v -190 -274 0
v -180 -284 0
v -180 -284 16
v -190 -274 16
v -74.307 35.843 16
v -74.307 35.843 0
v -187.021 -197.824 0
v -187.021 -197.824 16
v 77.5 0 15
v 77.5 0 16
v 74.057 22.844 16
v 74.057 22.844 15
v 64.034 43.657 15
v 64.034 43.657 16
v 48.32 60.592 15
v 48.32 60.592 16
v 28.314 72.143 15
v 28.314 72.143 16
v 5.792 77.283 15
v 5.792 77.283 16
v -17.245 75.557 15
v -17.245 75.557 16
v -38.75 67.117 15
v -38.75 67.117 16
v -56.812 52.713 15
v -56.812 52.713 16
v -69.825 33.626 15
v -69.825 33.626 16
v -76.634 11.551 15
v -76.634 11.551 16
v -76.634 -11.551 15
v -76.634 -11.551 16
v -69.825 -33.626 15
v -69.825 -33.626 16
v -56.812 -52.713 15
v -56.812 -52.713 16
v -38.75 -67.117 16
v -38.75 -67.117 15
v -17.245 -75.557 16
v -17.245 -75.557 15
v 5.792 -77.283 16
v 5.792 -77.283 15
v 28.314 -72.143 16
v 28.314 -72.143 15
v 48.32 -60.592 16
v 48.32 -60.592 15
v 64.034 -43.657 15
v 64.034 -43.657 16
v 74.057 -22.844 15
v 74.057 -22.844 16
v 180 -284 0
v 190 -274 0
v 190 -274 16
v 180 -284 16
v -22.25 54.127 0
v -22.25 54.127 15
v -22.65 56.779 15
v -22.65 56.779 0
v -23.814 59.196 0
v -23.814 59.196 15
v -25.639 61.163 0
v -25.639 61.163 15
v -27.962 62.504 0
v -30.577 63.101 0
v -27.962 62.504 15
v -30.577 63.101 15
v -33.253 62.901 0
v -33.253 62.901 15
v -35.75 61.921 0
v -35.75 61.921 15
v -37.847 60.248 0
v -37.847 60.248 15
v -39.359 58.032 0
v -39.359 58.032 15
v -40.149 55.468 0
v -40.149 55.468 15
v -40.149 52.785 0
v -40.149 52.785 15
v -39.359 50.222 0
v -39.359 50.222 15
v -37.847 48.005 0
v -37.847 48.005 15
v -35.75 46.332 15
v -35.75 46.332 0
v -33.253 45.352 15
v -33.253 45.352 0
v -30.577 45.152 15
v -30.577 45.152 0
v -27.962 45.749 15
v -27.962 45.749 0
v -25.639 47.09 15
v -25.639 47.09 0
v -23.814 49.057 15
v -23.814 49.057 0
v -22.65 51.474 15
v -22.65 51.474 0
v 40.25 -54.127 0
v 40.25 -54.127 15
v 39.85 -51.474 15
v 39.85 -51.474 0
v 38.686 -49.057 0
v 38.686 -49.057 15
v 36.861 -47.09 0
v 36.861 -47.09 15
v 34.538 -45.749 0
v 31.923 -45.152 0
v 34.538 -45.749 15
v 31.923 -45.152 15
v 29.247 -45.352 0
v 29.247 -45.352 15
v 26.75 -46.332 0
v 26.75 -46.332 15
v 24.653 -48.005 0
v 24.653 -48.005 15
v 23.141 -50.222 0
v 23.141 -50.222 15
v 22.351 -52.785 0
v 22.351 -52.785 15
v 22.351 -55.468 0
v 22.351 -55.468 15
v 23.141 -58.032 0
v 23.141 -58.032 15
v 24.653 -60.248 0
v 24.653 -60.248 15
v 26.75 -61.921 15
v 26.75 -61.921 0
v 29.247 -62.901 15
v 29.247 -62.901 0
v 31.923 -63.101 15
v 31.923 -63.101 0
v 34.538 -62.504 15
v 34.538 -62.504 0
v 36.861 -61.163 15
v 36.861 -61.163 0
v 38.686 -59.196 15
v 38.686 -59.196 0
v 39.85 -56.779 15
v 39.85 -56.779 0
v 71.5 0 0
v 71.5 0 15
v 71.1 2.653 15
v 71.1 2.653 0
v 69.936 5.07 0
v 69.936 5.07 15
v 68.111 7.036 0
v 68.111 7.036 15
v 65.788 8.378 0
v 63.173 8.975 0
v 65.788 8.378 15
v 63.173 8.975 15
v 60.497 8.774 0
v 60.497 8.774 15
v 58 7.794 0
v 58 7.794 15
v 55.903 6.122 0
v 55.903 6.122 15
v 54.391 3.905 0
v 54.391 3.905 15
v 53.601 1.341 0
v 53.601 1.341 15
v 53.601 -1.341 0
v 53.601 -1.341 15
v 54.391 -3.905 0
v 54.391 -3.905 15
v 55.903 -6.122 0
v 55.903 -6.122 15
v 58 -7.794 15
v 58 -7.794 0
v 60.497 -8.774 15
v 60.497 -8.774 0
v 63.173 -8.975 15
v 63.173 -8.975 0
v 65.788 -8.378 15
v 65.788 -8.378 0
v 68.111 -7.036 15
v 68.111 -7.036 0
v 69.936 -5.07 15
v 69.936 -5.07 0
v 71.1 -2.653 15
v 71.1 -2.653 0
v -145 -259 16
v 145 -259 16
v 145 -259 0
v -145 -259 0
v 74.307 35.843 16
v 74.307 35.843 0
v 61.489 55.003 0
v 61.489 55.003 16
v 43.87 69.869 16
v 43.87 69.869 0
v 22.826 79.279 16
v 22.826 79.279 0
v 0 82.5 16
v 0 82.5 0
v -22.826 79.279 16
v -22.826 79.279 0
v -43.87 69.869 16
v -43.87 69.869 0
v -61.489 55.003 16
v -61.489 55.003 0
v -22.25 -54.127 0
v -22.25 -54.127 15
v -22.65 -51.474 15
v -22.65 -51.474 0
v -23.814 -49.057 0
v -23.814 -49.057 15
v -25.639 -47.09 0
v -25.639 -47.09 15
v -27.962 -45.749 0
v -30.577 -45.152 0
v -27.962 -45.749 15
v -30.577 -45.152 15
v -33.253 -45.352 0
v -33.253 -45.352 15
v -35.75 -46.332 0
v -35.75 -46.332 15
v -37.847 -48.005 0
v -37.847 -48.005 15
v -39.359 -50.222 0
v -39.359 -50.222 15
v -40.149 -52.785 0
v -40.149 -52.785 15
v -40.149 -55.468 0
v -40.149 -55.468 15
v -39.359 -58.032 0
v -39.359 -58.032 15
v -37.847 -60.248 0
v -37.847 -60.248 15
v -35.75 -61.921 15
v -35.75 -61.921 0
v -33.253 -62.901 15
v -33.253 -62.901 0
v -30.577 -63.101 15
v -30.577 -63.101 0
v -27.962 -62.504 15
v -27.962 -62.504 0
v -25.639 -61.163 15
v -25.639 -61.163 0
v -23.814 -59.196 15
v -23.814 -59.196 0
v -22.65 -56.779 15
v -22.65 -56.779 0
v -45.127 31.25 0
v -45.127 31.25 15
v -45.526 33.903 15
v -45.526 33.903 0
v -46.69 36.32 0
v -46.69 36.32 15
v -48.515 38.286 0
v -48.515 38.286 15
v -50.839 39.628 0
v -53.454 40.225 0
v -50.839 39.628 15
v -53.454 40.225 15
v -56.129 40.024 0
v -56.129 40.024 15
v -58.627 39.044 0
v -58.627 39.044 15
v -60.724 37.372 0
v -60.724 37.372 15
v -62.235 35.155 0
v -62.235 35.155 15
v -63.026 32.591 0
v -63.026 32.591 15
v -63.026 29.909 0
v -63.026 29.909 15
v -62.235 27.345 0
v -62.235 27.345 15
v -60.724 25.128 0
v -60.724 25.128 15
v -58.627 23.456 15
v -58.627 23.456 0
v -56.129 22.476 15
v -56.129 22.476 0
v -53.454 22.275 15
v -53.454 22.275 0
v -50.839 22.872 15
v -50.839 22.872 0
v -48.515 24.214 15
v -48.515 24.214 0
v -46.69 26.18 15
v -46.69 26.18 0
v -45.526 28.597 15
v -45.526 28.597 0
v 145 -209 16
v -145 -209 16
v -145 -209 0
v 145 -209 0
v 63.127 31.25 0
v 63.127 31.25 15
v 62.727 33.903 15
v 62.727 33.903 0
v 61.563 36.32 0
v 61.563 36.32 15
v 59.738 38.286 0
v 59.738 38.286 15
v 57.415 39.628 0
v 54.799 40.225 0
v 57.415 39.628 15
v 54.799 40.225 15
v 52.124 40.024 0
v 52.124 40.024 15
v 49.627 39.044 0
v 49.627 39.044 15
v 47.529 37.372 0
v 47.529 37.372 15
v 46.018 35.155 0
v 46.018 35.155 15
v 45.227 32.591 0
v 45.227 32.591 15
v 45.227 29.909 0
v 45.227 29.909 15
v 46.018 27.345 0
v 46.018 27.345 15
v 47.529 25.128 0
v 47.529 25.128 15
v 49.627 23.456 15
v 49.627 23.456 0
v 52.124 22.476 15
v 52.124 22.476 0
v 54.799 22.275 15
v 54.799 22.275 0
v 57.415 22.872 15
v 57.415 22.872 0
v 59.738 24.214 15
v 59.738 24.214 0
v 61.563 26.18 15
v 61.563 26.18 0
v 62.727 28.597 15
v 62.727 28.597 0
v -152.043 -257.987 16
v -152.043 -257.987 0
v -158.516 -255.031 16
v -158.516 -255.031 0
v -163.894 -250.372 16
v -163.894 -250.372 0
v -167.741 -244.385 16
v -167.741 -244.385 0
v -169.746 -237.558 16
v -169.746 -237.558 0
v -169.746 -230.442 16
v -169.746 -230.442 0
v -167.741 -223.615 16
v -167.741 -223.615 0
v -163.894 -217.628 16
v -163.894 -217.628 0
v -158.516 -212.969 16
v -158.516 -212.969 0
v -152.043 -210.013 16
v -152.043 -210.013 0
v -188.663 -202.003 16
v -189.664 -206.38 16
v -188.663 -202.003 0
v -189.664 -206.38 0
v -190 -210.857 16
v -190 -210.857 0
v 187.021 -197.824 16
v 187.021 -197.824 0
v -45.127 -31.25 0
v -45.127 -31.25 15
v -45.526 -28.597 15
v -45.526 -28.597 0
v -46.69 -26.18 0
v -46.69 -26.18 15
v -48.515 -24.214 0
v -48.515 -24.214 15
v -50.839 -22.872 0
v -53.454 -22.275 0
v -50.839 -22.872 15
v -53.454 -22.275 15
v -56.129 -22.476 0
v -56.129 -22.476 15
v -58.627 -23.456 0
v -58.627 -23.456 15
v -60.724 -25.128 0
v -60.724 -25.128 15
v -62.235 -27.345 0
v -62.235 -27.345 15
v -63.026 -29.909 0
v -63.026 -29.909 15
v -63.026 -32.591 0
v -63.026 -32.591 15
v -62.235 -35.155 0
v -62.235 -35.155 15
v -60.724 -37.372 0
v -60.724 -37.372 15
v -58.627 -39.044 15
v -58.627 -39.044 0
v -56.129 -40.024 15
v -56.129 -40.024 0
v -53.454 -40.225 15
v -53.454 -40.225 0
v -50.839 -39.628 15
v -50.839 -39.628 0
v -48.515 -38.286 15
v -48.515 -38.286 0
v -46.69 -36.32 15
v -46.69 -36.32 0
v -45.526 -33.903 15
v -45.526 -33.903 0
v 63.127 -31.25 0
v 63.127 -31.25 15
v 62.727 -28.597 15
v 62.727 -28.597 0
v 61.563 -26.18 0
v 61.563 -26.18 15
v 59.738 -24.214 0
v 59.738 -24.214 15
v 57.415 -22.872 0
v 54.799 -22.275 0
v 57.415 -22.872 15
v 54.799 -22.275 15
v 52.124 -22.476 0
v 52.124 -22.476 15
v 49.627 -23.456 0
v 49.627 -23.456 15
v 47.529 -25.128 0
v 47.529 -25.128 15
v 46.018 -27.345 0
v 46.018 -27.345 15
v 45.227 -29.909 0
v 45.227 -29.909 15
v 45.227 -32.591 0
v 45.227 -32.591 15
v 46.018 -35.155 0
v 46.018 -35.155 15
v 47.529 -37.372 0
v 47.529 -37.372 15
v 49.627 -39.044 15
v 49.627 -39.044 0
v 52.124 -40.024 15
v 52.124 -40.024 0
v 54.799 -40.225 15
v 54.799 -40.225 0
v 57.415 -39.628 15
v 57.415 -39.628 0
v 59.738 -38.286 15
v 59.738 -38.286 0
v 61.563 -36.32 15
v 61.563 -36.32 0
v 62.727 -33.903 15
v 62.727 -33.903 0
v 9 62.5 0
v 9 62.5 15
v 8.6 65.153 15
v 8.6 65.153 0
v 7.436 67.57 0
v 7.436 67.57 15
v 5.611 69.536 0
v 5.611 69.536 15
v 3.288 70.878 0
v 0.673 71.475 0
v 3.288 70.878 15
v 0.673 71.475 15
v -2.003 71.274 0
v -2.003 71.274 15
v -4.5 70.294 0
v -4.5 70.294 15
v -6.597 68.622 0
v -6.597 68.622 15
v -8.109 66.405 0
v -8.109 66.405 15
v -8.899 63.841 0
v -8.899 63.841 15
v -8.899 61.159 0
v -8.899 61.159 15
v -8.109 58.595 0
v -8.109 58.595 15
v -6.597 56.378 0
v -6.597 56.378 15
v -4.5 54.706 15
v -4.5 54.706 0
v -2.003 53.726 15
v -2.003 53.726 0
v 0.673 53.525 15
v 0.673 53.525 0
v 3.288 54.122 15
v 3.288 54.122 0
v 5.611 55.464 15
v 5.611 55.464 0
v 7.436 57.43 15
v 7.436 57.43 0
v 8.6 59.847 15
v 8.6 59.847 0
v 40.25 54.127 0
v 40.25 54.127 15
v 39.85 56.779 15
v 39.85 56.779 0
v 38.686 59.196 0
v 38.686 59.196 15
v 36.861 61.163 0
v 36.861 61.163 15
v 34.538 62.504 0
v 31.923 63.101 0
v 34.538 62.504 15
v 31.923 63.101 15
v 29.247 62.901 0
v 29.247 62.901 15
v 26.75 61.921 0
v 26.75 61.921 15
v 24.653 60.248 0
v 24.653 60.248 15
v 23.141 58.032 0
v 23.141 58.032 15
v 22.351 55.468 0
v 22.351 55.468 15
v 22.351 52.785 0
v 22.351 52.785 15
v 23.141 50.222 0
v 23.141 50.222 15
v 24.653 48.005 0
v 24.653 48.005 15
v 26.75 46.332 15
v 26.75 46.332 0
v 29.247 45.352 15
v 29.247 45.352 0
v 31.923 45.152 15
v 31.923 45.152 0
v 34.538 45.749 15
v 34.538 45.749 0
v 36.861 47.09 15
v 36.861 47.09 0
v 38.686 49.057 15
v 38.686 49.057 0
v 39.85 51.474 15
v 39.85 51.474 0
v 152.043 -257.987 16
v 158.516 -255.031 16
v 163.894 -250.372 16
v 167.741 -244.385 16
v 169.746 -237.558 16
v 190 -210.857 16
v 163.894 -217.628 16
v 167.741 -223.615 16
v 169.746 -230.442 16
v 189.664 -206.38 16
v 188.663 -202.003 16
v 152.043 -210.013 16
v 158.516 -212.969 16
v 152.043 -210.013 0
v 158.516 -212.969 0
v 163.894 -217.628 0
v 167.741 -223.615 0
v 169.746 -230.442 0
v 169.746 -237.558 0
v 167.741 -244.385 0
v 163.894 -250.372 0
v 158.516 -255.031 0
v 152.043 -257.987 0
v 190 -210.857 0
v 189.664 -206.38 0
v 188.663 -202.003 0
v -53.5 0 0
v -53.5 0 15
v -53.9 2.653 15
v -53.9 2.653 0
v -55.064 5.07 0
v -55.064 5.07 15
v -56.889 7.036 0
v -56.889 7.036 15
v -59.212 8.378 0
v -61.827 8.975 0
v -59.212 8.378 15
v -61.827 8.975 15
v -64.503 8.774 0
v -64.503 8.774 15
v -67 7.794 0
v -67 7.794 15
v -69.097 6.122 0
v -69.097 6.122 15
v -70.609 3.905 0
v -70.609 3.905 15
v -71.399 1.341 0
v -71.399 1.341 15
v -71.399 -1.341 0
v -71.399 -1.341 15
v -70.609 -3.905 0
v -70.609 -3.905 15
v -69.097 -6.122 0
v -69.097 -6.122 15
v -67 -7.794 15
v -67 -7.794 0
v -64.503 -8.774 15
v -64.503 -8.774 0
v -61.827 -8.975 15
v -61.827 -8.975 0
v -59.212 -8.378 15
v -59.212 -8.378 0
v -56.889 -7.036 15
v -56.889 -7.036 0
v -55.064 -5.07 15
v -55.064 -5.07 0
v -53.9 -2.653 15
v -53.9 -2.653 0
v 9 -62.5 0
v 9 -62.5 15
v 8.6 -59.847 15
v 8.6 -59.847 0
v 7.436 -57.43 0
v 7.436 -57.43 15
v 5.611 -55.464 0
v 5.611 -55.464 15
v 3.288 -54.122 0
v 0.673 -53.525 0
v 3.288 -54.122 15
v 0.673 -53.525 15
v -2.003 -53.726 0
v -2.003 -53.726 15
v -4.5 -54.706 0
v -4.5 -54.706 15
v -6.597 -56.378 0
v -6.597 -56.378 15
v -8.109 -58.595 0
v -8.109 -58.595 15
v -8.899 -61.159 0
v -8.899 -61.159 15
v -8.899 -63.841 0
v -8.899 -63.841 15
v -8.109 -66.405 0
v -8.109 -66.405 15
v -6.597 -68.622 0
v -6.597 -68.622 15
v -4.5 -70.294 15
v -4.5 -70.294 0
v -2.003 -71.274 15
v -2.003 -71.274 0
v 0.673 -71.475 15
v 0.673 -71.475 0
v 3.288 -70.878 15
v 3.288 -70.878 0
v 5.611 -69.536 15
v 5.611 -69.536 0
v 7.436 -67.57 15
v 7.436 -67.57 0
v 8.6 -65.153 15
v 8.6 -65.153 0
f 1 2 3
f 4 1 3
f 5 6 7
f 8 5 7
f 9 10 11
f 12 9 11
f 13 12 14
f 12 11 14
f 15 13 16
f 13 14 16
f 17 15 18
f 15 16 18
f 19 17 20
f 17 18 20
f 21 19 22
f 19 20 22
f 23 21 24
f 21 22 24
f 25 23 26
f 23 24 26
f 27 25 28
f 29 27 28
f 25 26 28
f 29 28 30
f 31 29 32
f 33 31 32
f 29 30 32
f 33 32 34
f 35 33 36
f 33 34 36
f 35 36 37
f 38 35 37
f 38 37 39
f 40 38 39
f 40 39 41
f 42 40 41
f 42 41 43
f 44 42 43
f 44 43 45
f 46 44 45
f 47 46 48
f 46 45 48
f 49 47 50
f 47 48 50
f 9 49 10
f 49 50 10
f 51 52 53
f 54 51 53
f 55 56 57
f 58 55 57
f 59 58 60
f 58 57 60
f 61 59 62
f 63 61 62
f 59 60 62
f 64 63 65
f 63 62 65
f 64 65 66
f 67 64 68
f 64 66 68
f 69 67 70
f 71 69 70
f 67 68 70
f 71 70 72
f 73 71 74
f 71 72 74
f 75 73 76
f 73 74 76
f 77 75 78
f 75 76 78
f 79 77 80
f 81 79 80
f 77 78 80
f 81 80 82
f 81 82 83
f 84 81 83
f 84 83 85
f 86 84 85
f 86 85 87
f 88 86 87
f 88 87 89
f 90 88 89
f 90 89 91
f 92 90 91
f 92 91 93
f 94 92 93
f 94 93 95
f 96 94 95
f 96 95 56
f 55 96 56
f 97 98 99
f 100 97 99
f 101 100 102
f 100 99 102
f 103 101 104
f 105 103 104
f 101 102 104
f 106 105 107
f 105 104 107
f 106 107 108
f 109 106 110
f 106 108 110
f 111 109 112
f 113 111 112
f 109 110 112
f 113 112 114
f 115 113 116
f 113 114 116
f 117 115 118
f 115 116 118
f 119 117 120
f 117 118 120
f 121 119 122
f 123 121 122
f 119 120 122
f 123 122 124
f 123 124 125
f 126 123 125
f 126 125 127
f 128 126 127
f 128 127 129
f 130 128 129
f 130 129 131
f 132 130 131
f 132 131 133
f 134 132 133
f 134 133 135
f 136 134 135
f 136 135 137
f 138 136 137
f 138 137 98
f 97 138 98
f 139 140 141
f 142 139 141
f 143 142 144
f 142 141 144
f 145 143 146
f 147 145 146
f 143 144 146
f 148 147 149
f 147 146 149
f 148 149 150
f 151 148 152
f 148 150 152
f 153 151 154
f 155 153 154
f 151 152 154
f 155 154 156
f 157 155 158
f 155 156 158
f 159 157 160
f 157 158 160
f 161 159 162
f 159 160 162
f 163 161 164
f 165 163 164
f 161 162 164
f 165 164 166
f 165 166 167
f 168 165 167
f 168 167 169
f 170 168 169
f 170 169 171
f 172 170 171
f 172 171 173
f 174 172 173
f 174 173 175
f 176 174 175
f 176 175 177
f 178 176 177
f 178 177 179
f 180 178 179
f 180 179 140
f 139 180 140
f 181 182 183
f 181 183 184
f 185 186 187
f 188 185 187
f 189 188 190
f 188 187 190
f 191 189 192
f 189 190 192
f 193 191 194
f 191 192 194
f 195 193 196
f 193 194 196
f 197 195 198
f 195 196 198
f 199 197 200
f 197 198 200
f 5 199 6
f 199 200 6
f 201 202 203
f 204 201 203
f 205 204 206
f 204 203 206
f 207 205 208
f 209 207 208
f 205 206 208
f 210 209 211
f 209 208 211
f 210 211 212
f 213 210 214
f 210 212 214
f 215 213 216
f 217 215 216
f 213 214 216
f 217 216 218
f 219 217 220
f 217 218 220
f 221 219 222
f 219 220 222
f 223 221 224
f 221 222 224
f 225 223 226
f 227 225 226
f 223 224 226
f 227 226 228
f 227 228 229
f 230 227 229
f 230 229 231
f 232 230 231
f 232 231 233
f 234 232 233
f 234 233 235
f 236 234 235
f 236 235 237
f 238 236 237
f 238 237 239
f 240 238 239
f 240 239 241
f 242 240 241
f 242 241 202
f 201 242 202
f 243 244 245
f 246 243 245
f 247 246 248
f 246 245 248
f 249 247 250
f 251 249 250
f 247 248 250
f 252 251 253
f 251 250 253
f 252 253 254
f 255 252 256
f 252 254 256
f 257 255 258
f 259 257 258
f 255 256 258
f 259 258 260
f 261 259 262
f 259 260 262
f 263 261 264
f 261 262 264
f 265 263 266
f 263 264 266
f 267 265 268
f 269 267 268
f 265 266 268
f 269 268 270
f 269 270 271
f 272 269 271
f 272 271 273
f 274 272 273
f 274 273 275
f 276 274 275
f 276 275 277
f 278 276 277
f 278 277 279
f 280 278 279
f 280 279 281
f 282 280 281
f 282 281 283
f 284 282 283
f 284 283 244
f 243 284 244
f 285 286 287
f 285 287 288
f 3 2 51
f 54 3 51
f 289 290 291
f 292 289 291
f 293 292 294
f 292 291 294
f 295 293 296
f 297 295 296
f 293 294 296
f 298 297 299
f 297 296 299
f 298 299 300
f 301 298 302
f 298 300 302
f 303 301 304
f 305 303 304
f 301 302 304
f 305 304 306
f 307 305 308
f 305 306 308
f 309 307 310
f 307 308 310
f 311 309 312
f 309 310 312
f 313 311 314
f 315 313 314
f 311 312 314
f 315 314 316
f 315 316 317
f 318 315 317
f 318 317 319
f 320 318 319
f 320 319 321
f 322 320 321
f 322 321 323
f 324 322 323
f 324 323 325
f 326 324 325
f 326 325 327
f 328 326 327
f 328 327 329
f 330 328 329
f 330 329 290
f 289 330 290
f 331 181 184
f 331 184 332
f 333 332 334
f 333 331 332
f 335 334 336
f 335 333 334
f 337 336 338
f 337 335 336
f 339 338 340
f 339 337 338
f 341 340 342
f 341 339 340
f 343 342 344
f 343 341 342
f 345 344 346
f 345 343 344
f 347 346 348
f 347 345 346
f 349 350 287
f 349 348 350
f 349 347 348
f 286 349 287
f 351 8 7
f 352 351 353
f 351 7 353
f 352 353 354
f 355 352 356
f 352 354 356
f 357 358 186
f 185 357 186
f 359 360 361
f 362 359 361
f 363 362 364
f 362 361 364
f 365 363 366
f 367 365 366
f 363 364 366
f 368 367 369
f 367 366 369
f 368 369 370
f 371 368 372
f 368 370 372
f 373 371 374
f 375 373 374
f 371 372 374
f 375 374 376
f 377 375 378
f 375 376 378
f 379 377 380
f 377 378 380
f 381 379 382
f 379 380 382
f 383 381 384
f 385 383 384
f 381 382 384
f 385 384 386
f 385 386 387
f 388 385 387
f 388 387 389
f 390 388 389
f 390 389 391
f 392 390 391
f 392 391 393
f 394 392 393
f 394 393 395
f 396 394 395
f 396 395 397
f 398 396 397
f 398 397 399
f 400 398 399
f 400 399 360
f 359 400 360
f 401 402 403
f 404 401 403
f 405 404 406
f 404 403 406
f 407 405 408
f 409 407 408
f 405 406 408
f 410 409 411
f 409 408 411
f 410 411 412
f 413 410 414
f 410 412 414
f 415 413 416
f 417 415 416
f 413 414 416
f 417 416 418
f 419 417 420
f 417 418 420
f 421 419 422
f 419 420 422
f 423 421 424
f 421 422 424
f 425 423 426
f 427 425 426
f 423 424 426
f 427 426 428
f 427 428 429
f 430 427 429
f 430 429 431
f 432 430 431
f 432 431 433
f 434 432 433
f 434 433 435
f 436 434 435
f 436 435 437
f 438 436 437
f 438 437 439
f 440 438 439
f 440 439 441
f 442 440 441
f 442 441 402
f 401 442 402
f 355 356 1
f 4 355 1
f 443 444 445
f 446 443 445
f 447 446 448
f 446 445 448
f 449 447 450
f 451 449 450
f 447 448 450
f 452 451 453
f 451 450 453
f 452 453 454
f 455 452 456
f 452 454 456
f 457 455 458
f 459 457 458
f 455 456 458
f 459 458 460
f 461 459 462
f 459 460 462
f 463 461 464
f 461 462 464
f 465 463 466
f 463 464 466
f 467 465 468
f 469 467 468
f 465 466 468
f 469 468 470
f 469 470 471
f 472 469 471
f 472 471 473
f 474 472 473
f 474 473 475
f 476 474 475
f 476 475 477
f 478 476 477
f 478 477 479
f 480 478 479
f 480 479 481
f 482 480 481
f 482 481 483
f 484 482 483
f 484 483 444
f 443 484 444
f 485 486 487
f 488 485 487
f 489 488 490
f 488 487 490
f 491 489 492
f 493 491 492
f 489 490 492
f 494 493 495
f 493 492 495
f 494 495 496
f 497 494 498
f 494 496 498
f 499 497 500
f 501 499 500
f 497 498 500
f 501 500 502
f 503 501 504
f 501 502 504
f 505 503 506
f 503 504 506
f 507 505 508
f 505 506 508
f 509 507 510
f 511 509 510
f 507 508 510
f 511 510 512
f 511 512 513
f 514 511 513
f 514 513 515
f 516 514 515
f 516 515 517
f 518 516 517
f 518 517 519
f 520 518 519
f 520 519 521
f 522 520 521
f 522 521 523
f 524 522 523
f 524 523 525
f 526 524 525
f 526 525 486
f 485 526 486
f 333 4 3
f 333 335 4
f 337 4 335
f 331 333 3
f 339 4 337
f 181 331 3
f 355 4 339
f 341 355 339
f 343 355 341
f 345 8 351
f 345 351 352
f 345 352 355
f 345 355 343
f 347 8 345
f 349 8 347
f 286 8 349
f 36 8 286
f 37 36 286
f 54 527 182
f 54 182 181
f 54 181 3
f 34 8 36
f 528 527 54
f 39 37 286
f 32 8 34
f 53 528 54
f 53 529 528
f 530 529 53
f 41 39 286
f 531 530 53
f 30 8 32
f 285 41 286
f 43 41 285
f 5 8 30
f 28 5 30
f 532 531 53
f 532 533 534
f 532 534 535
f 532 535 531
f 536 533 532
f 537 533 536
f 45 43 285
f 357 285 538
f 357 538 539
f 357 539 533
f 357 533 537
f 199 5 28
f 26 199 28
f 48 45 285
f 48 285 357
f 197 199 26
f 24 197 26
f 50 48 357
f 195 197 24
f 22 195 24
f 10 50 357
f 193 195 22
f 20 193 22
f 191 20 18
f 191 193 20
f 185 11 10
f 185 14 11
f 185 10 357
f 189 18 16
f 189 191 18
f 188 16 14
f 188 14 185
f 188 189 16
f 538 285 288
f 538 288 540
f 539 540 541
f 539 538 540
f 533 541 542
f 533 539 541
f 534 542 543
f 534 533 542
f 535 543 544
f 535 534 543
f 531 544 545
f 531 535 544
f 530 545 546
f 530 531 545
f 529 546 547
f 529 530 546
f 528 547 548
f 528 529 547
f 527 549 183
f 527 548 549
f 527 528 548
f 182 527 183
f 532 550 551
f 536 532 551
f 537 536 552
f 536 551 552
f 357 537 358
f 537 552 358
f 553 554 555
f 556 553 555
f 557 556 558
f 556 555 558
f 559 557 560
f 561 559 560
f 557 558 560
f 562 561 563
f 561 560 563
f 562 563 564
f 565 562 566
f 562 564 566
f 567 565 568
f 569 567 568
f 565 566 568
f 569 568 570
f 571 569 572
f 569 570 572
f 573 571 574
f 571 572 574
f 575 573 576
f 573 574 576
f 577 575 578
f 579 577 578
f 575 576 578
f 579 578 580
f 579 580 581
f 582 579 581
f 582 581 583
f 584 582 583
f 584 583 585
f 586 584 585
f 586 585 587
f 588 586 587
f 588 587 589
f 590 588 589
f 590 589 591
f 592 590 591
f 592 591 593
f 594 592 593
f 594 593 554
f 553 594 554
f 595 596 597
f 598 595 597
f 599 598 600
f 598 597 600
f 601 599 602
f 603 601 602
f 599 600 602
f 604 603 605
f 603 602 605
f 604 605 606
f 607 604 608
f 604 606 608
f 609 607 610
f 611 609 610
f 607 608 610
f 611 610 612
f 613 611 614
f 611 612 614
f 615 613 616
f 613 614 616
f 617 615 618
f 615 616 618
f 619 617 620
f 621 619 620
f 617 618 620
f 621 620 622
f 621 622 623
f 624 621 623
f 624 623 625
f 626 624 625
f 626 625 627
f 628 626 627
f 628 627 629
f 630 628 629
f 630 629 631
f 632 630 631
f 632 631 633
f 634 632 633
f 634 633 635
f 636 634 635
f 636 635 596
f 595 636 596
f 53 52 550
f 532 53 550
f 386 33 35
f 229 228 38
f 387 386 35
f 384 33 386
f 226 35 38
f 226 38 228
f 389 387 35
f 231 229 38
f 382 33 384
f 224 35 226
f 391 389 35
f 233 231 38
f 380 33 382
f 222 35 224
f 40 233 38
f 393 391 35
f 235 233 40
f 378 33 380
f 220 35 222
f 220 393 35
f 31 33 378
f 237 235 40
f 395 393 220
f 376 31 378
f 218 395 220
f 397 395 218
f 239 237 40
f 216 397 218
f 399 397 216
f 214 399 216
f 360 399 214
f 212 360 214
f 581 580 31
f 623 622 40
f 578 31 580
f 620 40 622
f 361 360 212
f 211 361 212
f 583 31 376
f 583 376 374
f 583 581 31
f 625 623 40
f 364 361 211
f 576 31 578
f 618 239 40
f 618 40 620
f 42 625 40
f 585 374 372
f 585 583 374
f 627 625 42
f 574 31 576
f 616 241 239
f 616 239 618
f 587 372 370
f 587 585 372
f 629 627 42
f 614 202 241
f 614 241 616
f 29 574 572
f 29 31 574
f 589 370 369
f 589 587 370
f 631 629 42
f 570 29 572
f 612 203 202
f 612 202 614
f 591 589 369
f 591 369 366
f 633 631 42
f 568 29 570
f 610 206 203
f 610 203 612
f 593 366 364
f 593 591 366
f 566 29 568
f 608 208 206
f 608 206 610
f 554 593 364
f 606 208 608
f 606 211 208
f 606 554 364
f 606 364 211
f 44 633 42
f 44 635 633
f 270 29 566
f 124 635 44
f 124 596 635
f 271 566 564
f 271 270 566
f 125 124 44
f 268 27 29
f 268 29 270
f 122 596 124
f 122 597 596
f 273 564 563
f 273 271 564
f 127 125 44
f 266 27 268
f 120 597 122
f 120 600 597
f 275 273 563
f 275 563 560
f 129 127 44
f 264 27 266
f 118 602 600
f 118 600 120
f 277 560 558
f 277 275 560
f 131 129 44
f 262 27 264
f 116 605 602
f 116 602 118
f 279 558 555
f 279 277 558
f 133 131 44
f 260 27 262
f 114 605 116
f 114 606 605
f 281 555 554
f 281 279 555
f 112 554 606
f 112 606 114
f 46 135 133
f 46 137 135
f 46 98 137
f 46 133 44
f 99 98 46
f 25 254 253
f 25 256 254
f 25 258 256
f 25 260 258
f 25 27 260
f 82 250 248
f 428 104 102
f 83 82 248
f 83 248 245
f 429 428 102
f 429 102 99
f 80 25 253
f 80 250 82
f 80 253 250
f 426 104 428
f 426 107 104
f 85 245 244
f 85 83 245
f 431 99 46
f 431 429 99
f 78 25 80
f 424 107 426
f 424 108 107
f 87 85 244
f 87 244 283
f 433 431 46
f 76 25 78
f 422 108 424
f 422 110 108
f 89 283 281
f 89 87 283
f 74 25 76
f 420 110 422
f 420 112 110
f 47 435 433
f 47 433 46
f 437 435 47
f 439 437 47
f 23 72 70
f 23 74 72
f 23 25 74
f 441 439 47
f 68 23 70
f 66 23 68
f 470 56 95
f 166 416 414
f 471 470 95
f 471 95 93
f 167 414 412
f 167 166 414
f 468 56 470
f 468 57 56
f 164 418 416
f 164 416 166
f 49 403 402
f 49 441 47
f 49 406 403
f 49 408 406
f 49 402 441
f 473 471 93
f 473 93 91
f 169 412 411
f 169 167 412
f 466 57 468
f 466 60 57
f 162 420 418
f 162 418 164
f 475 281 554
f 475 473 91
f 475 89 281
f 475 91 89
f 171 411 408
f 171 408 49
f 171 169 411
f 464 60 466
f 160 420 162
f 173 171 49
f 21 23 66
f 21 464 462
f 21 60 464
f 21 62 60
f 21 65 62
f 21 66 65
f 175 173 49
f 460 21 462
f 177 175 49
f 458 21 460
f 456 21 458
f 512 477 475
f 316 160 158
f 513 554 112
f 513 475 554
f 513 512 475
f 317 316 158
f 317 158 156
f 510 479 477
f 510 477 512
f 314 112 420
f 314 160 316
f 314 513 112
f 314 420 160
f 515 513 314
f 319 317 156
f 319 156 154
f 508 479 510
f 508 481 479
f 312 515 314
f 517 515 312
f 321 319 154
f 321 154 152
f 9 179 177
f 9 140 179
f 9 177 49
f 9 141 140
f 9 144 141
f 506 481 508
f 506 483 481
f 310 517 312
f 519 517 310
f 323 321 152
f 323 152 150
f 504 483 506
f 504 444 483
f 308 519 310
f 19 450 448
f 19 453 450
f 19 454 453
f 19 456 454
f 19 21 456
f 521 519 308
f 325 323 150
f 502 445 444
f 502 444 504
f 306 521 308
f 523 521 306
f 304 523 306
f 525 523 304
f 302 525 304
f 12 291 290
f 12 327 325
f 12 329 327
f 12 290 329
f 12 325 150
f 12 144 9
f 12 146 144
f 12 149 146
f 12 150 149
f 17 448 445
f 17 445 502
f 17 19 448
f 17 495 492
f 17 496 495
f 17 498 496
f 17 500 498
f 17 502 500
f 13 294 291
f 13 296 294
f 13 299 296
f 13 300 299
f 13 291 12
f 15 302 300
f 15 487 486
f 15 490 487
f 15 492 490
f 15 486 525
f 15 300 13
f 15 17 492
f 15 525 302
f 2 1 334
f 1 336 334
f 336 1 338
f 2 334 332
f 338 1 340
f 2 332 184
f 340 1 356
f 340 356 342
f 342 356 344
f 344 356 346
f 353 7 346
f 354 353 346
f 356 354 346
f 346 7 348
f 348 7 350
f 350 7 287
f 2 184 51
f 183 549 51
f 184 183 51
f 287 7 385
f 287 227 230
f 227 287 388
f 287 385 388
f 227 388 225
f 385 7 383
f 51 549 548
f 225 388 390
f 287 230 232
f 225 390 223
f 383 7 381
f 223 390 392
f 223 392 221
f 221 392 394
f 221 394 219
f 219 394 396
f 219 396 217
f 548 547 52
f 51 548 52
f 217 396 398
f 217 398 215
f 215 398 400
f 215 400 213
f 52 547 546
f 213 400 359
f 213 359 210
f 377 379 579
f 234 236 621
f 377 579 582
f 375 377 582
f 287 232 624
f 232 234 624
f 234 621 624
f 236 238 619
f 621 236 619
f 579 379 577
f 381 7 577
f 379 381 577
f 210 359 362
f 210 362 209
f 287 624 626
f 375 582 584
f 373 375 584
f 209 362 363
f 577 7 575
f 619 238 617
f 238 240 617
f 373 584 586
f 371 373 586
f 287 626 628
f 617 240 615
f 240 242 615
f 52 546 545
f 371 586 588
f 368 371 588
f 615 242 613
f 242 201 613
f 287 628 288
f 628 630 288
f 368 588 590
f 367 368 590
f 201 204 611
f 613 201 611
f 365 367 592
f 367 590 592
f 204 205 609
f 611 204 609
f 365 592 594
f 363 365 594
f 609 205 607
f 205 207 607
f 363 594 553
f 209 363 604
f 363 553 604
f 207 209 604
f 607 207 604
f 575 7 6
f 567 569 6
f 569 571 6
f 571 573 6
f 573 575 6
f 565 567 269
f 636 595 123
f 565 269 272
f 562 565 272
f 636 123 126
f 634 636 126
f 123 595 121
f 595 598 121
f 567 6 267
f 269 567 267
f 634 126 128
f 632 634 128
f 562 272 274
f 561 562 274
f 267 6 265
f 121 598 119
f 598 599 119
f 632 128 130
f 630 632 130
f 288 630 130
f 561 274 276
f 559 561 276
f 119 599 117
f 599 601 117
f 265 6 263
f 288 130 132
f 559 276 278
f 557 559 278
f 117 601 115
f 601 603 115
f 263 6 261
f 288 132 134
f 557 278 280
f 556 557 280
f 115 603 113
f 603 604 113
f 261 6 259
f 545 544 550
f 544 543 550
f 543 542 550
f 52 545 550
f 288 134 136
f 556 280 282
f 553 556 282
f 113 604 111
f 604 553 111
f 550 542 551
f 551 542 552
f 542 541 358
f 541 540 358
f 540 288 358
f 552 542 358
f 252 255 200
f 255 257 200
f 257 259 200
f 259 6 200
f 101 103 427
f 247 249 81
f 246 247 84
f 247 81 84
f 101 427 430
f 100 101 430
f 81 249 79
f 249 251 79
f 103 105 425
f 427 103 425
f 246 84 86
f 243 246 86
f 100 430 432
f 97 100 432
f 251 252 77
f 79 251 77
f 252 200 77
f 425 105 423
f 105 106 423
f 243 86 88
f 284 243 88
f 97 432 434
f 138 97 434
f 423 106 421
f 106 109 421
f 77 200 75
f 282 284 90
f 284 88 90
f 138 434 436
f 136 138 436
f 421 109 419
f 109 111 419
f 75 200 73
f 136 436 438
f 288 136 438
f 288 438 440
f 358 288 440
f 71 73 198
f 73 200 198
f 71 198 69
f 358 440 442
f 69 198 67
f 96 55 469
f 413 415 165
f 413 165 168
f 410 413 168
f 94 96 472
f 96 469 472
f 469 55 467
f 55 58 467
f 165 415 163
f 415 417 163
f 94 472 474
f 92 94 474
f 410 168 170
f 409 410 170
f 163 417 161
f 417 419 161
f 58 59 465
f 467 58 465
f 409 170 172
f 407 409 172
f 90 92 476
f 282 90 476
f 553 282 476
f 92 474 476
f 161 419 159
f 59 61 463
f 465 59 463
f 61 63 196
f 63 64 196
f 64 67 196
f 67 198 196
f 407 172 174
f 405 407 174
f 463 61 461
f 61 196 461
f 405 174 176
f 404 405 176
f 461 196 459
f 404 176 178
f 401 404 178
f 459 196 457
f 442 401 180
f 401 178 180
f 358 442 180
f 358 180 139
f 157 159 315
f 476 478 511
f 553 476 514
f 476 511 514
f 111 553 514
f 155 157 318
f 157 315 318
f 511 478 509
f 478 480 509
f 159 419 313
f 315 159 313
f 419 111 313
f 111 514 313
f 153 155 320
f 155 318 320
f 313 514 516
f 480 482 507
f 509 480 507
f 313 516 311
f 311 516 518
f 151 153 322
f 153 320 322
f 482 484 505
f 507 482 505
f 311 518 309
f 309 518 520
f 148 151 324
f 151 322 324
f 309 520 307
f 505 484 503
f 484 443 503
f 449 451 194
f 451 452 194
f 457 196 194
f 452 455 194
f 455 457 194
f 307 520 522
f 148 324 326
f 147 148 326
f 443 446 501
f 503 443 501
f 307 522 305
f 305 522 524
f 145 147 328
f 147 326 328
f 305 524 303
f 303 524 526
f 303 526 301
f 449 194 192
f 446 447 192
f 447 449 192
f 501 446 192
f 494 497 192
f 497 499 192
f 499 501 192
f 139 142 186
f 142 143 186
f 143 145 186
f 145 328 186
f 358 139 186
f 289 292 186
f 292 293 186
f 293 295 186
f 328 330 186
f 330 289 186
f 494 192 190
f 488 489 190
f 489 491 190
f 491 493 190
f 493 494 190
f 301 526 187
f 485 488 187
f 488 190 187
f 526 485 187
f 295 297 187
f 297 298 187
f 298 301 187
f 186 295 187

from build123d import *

# Parameters (mm, degrees)
EXTRUDE_1_DEPTH     = 16
SKETCH_2_R          = 77.5
CUT_EXTRUDE_1_DEPTH = 1
CUT_EXTRUDE_2_REACH = 344.025
SKETCH_3_R          = 9
CUT_EXTRUDE_3_REACH = 344.07
CHAMFER_1_SIZE      = 10


with BuildPart() as part:
    # 草图1 → 凸台-拉伸1 (new body)
    with BuildSketch(Plane.XY):
        with BuildLine():
            Line((-74.306819623, 35.843361414), (-187.020661681, -197.82353813))
            ThreePointArc((-187.020661681, -197.82353813), (-189.245682164, -204.172424177), (-190, -210.857487736))
            Line((-190, -210.857487736), (-190, -284))
            Line((-190, -284), (0, -284))
            Line((0, -284), (190, -284))
            Line((190, -284), (190, -210.857487736))
            ThreePointArc((190, -210.857487736), (189.245682164, -204.172424177), (187.020661681, -197.82353813))
            Line((187.020661681, -197.82353813), (74.306819623, 35.843361414))
            ThreePointArc((74.306819623, 35.843361414), (0, 82.5), (-74.306819623, 35.843361414))
        make_face()
    extrude(amount=EXTRUDE_1_DEPTH)

    # 草图2 → 切除-拉伸1 (cut)
    with BuildSketch(Plane.XY.offset(16)):
        Circle(SKETCH_2_R)
    extrude(amount=-CUT_EXTRUDE_1_DEPTH, mode=Mode.SUBTRACT)

    # 草图3 → 切除-拉伸2 (cut, up to next)
    with BuildSketch(Plane.XY.offset(15), mode=Mode.PRIVATE) as cut_extrude_2_sk1:
        with Locations((0, 62.5)):
            Circle(SKETCH_3_R)
    cut_extrude_2_tool1 = extrude(cut_extrude_2_sk1.sketch, amount=-CUT_EXTRUDE_2_REACH, mode=Mode.PRIVATE) & part.part
    # 草图3 → 切除-拉伸2 (cut, up to next)
    with BuildSketch(Plane.XY.offset(15), mode=Mode.PRIVATE) as cut_extrude_2_sk2:
        with Locations((31.25, 54.126587737)):
            Circle(SKETCH_3_R)
    cut_extrude_2_tool2 = extrude(cut_extrude_2_sk2.sketch, amount=-CUT_EXTRUDE_2_REACH, mode=Mode.PRIVATE) & part.part
    # 草图3 → 切除-拉伸2 (cut, up to next)
    with BuildSketch(Plane.XY.offset(15), mode=Mode.PRIVATE) as cut_extrude_2_sk3:
        with Locations((54.126587737, 31.25)):
            Circle(SKETCH_3_R)
    cut_extrude_2_tool3 = extrude(cut_extrude_2_sk3.sketch, amount=-CUT_EXTRUDE_2_REACH, mode=Mode.PRIVATE) & part.part
    # 草图3 → 切除-拉伸2 (cut, up to next)
    with BuildSketch(Plane.XY.offset(15), mode=Mode.PRIVATE) as cut_extrude_2_sk4:
        with Locations((62.5, 0)):
            Circle(SKETCH_3_R)
    cut_extrude_2_tool4 = extrude(cut_extrude_2_sk4.sketch, amount=-CUT_EXTRUDE_2_REACH, mode=Mode.PRIVATE) & part.part
    # 草图3 → 切除-拉伸2 (cut, up to next)
    with BuildSketch(Plane.XY.offset(15), mode=Mode.PRIVATE) as cut_extrude_2_sk5:
        with Locations((54.126587737, -31.25)):
            Circle(SKETCH_3_R)
    cut_extrude_2_tool5 = extrude(cut_extrude_2_sk5.sketch, amount=-CUT_EXTRUDE_2_REACH, mode=Mode.PRIVATE) & part.part
    # 草图3 → 切除-拉伸2 (cut, up to next)
    with BuildSketch(Plane.XY.offset(15), mode=Mode.PRIVATE) as cut_extrude_2_sk6:
        with Locations((31.25, -54.126587737)):
            Circle(SKETCH_3_R)
    cut_extrude_2_tool6 = extrude(cut_extrude_2_sk6.sketch, amount=-CUT_EXTRUDE_2_REACH, mode=Mode.PRIVATE) & part.part
    # 草图3 → 切除-拉伸2 (cut, up to next)
    with BuildSketch(Plane.XY.offset(15), mode=Mode.PRIVATE) as cut_extrude_2_sk7:
        with Locations((0, -62.5)):
            Circle(SKETCH_3_R)
    cut_extrude_2_tool7 = extrude(cut_extrude_2_sk7.sketch, amount=-CUT_EXTRUDE_2_REACH, mode=Mode.PRIVATE) & part.part
    # 草图3 → 切除-拉伸2 (cut, up to next)
    with BuildSketch(Plane.XY.offset(15), mode=Mode.PRIVATE) as cut_extrude_2_sk8:
        with Locations((-31.25, -54.126587737)):
            Circle(SKETCH_3_R)
    cut_extrude_2_tool8 = extrude(cut_extrude_2_sk8.sketch, amount=-CUT_EXTRUDE_2_REACH, mode=Mode.PRIVATE) & part.part
    # 草图3 → 切除-拉伸2 (cut, up to next)
    with BuildSketch(Plane.XY.offset(15), mode=Mode.PRIVATE) as cut_extrude_2_sk9:
        with Locations((-54.126587737, -31.25)):
            Circle(SKETCH_3_R)
    cut_extrude_2_tool9 = extrude(cut_extrude_2_sk9.sketch, amount=-CUT_EXTRUDE_2_REACH, mode=Mode.PRIVATE) & part.part
    # 草图3 → 切除-拉伸2 (cut, up to next)
    with BuildSketch(Plane.XY.offset(15), mode=Mode.PRIVATE) as cut_extrude_2_sk10:
        with Locations((-62.5, 0)):
            Circle(SKETCH_3_R)
    cut_extrude_2_tool10 = extrude(cut_extrude_2_sk10.sketch, amount=-CUT_EXTRUDE_2_REACH, mode=Mode.PRIVATE) & part.part
    # 草图3 → 切除-拉伸2 (cut, up to next)
    with BuildSketch(Plane.XY.offset(15), mode=Mode.PRIVATE) as cut_extrude_2_sk11:
        with Locations((-54.126587737, 31.25)):
            Circle(SKETCH_3_R)
    cut_extrude_2_tool11 = extrude(cut_extrude_2_sk11.sketch, amount=-CUT_EXTRUDE_2_REACH, mode=Mode.PRIVATE) & part.part
    # 草图3 → 切除-拉伸2 (cut, up to next)
    with BuildSketch(Plane.XY.offset(15), mode=Mode.PRIVATE) as cut_extrude_2_sk12:
        with Locations((-31.25, 54.126587737)):
            Circle(SKETCH_3_R)
    cut_extrude_2_tool12 = extrude(cut_extrude_2_sk12.sketch, amount=-CUT_EXTRUDE_2_REACH, mode=Mode.PRIVATE) & part.part
    add(cut_extrude_2_tool1.solids().sort_by_distance((0, 62.5, 15))[0], mode=Mode.SUBTRACT)
    add(cut_extrude_2_tool2.solids().sort_by_distance((31.25, 54.126588, 15))[0], mode=Mode.SUBTRACT)
    add(cut_extrude_2_tool3.solids().sort_by_distance((54.126588, 31.25, 15))[0], mode=Mode.SUBTRACT)
    add(cut_extrude_2_tool4.solids().sort_by_distance((62.5, 0, 15))[0], mode=Mode.SUBTRACT)
    add(cut_extrude_2_tool5.solids().sort_by_distance((54.126588, -31.25, 15))[0], mode=Mode.SUBTRACT)
    add(cut_extrude_2_tool6.solids().sort_by_distance((31.25, -54.126588, 15))[0], mode=Mode.SUBTRACT)
    add(cut_extrude_2_tool7.solids().sort_by_distance((0, -62.5, 15))[0], mode=Mode.SUBTRACT)
    add(cut_extrude_2_tool8.solids().sort_by_distance((-31.25, -54.126588, 15))[0], mode=Mode.SUBTRACT)
    add(cut_extrude_2_tool9.solids().sort_by_distance((-54.126588, -31.25, 15))[0], mode=Mode.SUBTRACT)
    add(cut_extrude_2_tool10.solids().sort_by_distance((-62.5, 0, 15))[0], mode=Mode.SUBTRACT)
    add(cut_extrude_2_tool11.solids().sort_by_distance((-54.126588, 31.25, 15))[0], mode=Mode.SUBTRACT)
    add(cut_extrude_2_tool12.solids().sort_by_distance((-31.25, 54.126588, 15))[0], mode=Mode.SUBTRACT)

    # 草图4 → 切除-拉伸3 (cut, up to next)
    with BuildSketch(Plane.XY.offset(16), mode=Mode.PRIVATE) as cut_extrude_3_sk1:
        with BuildLine():
            Line((-145, -209), (145, -209))
            ThreePointArc((145, -209), (170, -234), (145, -259))
            Line((145, -259), (-145, -259))
            ThreePointArc((-145, -259), (-170, -234), (-145, -209))
        make_face()
    cut_extrude_3_tool1 = extrude(cut_extrude_3_sk1.sketch, amount=-CUT_EXTRUDE_3_REACH, mode=Mode.PRIVATE) & part.part
    add(cut_extrude_3_tool1.solids().sort_by_distance((0, -234, 16))[0], mode=Mode.SUBTRACT)

    # 倒角1
    chamfer_1_edges = [part.edges().sort_by_distance(p)[0] for p in [
        (190, -284, 8),
        (-190, -284, 8),
    ]]
    chamfer(chamfer_1_edges, length=CHAMFER_1_SIZE)


solid = part.part
